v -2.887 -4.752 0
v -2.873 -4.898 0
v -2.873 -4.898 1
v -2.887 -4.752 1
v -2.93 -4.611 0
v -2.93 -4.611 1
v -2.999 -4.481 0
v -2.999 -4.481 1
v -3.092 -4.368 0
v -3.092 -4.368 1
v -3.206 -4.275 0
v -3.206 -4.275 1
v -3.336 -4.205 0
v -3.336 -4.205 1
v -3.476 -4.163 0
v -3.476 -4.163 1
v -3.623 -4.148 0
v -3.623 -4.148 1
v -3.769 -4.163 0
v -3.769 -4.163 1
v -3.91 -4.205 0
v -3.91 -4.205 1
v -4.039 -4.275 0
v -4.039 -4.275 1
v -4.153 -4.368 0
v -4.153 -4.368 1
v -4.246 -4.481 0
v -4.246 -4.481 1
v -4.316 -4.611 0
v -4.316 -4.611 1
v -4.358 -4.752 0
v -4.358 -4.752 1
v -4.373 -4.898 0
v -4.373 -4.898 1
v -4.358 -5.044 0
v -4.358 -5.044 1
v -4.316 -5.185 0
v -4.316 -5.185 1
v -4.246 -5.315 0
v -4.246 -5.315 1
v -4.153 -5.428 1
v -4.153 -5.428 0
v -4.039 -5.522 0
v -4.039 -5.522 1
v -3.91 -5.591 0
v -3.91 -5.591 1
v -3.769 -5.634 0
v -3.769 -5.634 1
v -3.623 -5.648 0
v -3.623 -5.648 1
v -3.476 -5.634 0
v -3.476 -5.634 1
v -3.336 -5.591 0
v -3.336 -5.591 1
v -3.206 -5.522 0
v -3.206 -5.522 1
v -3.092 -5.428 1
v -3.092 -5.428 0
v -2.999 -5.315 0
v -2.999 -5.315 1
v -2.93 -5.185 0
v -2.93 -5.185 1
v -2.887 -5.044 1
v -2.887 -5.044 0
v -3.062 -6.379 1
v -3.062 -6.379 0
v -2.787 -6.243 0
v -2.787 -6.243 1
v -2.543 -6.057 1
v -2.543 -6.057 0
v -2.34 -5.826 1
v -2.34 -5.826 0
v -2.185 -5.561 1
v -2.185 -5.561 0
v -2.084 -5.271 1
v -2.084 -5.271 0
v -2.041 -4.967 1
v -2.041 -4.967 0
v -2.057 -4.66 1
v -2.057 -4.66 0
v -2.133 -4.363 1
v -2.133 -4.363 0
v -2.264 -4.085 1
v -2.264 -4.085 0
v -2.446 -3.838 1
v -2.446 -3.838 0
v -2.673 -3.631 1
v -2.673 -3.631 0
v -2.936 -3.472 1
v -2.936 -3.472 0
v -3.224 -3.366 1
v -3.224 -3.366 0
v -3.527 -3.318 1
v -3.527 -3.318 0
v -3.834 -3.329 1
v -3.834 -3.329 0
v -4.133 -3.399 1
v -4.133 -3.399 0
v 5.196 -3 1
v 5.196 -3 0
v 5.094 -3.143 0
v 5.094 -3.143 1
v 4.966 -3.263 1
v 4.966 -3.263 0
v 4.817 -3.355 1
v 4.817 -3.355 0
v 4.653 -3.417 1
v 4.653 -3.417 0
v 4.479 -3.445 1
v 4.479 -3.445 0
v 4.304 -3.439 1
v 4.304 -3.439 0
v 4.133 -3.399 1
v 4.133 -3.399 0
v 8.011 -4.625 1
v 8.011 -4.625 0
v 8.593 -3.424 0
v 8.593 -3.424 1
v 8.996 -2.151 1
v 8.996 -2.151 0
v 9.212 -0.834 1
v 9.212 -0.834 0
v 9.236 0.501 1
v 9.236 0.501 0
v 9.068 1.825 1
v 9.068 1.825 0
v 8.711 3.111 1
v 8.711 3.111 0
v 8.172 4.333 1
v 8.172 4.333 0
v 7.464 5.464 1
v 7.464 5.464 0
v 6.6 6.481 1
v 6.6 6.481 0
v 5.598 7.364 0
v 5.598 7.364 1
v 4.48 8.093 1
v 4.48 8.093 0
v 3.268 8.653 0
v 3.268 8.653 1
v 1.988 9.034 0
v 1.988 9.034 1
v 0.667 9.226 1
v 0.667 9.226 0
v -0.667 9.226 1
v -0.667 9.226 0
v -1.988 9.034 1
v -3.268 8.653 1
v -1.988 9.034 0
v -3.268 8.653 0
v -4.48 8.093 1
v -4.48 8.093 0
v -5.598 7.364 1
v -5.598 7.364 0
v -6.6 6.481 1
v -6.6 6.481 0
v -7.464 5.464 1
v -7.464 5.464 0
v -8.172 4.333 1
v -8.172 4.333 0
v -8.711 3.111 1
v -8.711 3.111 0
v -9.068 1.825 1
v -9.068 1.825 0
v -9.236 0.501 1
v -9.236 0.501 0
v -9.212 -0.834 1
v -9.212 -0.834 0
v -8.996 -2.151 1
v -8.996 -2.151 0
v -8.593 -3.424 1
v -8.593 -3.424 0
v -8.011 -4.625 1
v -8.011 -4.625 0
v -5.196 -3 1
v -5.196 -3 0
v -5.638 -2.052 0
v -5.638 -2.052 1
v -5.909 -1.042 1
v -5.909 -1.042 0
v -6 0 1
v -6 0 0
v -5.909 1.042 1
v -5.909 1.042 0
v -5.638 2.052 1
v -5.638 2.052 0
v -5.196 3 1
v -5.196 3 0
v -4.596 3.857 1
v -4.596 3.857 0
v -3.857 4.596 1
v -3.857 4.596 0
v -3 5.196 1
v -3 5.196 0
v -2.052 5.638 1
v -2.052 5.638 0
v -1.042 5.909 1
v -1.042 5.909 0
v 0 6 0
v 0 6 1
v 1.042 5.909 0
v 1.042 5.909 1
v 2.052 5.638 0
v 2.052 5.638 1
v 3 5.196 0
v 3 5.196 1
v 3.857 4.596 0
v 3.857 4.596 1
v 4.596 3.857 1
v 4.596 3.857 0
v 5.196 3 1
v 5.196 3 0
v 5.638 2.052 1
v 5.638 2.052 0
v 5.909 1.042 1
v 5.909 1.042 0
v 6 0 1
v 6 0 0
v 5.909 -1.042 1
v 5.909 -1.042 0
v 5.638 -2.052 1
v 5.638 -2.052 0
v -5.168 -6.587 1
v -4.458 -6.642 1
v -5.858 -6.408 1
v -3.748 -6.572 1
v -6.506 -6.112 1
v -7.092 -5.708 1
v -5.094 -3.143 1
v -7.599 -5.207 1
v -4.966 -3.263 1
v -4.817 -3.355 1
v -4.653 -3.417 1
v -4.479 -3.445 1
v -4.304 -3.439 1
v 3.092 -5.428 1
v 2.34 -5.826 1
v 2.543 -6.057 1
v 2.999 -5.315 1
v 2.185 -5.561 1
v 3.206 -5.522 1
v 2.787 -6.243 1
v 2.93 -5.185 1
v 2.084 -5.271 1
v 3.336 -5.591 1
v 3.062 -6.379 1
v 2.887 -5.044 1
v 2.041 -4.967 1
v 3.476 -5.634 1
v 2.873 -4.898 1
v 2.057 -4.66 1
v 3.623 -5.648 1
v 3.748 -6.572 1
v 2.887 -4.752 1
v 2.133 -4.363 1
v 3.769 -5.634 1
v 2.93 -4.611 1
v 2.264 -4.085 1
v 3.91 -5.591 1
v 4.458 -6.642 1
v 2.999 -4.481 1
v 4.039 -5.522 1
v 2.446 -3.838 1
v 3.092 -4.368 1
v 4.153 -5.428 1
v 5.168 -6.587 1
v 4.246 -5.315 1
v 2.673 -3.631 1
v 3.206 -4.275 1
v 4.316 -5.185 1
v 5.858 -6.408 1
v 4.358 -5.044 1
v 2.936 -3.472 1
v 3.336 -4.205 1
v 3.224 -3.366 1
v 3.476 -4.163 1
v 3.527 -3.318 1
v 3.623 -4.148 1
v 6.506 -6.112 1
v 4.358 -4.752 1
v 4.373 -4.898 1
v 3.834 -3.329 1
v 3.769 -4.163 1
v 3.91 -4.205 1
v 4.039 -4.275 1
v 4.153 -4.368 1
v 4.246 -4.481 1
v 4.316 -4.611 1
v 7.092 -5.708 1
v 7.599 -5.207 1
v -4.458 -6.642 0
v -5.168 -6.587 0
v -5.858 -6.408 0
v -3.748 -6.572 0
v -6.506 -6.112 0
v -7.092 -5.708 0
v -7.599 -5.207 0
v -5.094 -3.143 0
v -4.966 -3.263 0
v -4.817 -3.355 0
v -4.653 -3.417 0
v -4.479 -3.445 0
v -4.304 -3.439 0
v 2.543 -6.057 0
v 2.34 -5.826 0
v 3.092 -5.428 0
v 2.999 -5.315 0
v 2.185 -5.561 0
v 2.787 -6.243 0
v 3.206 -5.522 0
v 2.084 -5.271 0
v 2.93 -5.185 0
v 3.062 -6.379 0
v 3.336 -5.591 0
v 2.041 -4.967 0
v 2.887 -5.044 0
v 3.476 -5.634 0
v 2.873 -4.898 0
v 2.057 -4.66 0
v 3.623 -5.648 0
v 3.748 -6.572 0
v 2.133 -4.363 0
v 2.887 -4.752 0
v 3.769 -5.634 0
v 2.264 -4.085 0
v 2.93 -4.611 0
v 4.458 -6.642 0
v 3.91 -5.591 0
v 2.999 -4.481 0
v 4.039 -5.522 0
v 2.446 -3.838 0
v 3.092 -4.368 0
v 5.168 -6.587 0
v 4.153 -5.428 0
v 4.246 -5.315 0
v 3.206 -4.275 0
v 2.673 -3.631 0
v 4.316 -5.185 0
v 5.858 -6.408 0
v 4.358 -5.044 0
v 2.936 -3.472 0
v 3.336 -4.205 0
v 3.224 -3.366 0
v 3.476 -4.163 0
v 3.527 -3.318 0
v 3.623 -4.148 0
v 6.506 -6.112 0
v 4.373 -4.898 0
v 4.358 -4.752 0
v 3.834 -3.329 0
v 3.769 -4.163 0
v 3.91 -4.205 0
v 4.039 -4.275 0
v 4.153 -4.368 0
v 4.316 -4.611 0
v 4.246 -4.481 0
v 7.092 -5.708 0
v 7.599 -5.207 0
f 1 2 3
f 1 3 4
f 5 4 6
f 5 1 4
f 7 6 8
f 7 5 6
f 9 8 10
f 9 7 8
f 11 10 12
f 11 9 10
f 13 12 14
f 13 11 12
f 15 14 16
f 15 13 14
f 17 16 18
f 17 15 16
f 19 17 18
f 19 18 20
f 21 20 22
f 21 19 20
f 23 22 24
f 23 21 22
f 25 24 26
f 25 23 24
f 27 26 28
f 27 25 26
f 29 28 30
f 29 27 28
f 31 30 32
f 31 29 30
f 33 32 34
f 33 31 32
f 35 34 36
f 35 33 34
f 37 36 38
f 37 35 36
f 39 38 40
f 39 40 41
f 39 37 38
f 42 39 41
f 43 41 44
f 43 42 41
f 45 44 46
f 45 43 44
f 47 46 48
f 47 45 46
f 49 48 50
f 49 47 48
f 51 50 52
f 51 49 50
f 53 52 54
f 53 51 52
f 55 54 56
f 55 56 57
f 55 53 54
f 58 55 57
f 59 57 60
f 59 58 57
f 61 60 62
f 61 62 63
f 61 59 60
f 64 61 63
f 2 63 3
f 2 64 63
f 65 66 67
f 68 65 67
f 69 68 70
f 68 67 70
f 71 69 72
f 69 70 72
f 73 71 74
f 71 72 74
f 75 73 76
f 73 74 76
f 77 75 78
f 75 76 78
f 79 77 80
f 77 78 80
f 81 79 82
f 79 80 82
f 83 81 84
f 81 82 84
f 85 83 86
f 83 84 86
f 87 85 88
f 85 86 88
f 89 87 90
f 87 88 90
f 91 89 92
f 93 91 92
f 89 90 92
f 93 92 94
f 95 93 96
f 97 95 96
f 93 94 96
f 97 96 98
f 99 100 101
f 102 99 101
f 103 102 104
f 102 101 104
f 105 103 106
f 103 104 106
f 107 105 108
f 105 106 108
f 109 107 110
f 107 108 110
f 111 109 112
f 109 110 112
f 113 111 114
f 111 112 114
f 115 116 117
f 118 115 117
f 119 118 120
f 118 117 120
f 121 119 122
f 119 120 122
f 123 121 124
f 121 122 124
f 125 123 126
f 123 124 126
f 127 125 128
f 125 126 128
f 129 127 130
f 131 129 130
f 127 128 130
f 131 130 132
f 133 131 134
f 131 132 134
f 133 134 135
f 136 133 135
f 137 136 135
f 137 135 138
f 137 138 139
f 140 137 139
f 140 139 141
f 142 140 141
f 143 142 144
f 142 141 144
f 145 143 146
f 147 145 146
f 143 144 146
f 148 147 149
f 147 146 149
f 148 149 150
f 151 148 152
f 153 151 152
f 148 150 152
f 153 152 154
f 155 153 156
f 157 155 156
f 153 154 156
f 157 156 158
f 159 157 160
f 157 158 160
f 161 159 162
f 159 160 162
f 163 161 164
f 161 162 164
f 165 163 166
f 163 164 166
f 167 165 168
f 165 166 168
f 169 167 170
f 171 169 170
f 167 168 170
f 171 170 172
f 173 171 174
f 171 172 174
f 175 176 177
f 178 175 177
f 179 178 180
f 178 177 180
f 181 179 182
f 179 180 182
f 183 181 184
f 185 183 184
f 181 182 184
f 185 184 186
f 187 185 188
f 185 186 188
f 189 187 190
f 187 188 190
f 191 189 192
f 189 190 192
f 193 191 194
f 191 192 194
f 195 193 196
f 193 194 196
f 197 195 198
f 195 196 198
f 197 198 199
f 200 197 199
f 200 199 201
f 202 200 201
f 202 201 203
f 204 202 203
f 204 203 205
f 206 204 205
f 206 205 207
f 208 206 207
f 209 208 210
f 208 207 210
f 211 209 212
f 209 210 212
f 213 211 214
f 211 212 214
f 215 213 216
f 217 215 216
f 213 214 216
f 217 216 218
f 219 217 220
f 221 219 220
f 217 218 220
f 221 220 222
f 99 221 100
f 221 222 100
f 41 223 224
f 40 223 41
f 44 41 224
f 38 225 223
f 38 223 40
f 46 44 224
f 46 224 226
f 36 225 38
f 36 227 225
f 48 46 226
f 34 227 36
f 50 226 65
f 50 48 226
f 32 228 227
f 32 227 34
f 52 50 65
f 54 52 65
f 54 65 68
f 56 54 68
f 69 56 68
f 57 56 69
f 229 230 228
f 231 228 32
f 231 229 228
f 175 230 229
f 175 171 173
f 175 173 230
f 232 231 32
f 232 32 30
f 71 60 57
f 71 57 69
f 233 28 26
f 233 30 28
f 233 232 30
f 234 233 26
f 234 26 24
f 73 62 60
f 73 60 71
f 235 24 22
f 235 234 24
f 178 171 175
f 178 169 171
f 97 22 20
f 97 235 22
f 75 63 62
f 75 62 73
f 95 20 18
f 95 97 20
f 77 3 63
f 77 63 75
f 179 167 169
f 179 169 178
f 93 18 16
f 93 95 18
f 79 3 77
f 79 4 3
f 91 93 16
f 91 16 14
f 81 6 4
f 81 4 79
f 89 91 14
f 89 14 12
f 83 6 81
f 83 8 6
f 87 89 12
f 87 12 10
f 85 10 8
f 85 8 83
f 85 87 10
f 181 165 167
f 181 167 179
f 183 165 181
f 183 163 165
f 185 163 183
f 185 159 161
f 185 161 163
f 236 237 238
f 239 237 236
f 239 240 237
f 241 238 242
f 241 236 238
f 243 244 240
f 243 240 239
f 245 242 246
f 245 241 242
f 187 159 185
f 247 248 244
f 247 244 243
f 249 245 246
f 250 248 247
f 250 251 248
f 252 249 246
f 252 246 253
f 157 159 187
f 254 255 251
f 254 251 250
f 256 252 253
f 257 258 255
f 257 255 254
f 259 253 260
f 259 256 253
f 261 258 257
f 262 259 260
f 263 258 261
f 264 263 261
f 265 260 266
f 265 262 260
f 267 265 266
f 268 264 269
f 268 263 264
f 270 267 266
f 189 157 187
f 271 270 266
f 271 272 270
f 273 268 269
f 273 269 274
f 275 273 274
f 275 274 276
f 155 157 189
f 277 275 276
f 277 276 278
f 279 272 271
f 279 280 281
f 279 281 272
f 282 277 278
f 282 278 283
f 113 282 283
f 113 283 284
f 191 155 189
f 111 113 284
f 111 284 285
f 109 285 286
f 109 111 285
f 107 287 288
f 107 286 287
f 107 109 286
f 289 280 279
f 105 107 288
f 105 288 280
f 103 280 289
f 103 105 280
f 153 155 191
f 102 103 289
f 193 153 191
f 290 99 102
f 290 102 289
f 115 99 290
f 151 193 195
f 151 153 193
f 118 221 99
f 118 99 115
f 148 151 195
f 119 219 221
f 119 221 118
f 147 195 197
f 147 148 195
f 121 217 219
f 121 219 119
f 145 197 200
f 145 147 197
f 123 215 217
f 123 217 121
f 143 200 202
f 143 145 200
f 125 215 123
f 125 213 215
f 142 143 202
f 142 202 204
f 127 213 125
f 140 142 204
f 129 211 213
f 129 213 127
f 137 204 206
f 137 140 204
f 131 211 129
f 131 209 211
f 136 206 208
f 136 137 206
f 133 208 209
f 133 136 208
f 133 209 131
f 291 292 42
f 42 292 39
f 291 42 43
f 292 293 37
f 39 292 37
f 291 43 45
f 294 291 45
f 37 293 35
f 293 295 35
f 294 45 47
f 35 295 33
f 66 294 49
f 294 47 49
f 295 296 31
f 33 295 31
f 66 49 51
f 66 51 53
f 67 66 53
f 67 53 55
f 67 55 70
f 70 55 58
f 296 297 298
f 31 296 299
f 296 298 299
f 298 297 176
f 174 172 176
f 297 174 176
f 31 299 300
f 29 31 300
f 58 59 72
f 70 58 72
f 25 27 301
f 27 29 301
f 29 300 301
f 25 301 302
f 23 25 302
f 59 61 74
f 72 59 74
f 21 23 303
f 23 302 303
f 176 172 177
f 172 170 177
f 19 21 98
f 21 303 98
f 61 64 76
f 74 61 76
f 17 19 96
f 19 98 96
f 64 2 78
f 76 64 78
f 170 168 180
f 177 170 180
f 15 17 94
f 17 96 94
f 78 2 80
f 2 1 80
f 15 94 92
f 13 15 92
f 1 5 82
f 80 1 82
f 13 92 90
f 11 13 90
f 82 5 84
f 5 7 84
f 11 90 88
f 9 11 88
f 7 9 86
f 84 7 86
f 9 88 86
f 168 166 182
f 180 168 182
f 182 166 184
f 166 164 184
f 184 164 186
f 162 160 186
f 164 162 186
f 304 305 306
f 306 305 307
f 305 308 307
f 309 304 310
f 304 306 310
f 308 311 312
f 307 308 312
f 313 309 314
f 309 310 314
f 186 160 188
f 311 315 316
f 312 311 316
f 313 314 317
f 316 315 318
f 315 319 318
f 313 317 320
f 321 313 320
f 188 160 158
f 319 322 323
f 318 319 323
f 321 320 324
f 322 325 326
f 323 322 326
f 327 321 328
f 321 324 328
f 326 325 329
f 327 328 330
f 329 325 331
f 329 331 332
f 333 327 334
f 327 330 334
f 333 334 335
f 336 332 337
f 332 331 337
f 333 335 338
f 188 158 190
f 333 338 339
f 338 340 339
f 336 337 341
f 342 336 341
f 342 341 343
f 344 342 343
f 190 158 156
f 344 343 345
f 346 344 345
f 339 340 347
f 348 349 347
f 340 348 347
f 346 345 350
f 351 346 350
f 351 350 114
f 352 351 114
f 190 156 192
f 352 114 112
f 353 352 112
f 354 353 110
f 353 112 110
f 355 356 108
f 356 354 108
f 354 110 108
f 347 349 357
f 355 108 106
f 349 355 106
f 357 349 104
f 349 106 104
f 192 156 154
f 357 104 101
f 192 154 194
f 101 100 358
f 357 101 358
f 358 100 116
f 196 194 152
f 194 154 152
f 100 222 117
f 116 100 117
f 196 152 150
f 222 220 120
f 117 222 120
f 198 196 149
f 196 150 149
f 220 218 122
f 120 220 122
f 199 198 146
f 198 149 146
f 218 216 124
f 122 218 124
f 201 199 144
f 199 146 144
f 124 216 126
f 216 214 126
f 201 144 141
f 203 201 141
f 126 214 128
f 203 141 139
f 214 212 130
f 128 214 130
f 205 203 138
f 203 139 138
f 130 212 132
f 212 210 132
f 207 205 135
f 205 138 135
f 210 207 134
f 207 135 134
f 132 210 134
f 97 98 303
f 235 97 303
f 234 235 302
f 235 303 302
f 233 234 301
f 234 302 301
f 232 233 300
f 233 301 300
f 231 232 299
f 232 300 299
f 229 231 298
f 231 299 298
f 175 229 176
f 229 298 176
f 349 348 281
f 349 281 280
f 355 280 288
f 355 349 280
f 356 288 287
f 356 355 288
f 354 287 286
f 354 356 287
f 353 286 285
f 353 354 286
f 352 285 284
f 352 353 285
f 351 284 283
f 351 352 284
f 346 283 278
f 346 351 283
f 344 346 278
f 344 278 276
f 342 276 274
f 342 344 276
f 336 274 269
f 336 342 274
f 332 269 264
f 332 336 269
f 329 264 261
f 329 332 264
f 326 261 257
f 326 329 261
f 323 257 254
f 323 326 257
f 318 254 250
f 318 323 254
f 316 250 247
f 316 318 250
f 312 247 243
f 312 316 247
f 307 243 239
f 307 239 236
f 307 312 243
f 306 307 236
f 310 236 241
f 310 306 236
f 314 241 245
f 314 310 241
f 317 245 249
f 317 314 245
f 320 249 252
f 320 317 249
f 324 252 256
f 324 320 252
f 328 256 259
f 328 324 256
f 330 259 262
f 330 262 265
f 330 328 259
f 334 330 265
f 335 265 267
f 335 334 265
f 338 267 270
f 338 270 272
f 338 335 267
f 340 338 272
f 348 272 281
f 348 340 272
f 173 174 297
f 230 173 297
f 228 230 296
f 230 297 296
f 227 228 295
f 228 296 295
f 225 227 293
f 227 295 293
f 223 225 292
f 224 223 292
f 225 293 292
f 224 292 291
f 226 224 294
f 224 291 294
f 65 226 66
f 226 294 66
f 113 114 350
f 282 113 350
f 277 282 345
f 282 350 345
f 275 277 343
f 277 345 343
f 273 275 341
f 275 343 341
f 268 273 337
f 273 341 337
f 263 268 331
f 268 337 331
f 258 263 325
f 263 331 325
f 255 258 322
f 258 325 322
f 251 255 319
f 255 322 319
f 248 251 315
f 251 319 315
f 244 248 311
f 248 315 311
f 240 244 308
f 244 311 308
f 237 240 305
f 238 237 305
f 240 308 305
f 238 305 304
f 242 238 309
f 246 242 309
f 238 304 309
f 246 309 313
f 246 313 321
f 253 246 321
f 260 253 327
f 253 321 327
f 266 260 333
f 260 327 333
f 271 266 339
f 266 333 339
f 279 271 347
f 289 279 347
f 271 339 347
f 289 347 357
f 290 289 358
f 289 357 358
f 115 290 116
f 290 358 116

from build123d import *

# Parameters (mm, degrees)
F0_R     = 0.75
F1_DEPTH = 1


with BuildPart() as f1:
    # F0 (on Top) → F1 (new body)
    with BuildSketch(Plane.XY):
        with BuildLine():
            ThreePointArc((-5.196152, -3), (0, 6), (5.196152, -3))
            ThreePointArc((5.196152, -3), (4.736217, -3.390004), (4.133261, -3.399364))
            ThreePointArc((4.133261, -3.399364), (2.132517, -4.362657), (3.062402, -6.379145))
            ThreePointArc((3.062402, -6.379145), (5.857871, -6.408447), (8.010735, -4.625))
            ThreePointArc((8.010735, -4.625), (0, 9.25), (-8.010735, -4.625))
            ThreePointArc((-8.010735, -4.625), (-5.857871, -6.408447), (-3.062402, -6.379145))
            ThreePointArc((-3.062402, -6.379145), (-2.132517, -4.362657), (-4.133261, -3.399364))
            ThreePointArc((-4.133261, -3.399364), (-4.736217, -3.390004), (-5.196152, -3))
        make_face()
        with Locations((-3.622614, -4.898161)):
            Circle(F0_R, mode=Mode.SUBTRACT)
        with Locations((3.622614, -4.898161)):
            Circle(F0_R, mode=Mode.SUBTRACT)
    extrude(amount=F1_DEPTH)


solid = f1.part
